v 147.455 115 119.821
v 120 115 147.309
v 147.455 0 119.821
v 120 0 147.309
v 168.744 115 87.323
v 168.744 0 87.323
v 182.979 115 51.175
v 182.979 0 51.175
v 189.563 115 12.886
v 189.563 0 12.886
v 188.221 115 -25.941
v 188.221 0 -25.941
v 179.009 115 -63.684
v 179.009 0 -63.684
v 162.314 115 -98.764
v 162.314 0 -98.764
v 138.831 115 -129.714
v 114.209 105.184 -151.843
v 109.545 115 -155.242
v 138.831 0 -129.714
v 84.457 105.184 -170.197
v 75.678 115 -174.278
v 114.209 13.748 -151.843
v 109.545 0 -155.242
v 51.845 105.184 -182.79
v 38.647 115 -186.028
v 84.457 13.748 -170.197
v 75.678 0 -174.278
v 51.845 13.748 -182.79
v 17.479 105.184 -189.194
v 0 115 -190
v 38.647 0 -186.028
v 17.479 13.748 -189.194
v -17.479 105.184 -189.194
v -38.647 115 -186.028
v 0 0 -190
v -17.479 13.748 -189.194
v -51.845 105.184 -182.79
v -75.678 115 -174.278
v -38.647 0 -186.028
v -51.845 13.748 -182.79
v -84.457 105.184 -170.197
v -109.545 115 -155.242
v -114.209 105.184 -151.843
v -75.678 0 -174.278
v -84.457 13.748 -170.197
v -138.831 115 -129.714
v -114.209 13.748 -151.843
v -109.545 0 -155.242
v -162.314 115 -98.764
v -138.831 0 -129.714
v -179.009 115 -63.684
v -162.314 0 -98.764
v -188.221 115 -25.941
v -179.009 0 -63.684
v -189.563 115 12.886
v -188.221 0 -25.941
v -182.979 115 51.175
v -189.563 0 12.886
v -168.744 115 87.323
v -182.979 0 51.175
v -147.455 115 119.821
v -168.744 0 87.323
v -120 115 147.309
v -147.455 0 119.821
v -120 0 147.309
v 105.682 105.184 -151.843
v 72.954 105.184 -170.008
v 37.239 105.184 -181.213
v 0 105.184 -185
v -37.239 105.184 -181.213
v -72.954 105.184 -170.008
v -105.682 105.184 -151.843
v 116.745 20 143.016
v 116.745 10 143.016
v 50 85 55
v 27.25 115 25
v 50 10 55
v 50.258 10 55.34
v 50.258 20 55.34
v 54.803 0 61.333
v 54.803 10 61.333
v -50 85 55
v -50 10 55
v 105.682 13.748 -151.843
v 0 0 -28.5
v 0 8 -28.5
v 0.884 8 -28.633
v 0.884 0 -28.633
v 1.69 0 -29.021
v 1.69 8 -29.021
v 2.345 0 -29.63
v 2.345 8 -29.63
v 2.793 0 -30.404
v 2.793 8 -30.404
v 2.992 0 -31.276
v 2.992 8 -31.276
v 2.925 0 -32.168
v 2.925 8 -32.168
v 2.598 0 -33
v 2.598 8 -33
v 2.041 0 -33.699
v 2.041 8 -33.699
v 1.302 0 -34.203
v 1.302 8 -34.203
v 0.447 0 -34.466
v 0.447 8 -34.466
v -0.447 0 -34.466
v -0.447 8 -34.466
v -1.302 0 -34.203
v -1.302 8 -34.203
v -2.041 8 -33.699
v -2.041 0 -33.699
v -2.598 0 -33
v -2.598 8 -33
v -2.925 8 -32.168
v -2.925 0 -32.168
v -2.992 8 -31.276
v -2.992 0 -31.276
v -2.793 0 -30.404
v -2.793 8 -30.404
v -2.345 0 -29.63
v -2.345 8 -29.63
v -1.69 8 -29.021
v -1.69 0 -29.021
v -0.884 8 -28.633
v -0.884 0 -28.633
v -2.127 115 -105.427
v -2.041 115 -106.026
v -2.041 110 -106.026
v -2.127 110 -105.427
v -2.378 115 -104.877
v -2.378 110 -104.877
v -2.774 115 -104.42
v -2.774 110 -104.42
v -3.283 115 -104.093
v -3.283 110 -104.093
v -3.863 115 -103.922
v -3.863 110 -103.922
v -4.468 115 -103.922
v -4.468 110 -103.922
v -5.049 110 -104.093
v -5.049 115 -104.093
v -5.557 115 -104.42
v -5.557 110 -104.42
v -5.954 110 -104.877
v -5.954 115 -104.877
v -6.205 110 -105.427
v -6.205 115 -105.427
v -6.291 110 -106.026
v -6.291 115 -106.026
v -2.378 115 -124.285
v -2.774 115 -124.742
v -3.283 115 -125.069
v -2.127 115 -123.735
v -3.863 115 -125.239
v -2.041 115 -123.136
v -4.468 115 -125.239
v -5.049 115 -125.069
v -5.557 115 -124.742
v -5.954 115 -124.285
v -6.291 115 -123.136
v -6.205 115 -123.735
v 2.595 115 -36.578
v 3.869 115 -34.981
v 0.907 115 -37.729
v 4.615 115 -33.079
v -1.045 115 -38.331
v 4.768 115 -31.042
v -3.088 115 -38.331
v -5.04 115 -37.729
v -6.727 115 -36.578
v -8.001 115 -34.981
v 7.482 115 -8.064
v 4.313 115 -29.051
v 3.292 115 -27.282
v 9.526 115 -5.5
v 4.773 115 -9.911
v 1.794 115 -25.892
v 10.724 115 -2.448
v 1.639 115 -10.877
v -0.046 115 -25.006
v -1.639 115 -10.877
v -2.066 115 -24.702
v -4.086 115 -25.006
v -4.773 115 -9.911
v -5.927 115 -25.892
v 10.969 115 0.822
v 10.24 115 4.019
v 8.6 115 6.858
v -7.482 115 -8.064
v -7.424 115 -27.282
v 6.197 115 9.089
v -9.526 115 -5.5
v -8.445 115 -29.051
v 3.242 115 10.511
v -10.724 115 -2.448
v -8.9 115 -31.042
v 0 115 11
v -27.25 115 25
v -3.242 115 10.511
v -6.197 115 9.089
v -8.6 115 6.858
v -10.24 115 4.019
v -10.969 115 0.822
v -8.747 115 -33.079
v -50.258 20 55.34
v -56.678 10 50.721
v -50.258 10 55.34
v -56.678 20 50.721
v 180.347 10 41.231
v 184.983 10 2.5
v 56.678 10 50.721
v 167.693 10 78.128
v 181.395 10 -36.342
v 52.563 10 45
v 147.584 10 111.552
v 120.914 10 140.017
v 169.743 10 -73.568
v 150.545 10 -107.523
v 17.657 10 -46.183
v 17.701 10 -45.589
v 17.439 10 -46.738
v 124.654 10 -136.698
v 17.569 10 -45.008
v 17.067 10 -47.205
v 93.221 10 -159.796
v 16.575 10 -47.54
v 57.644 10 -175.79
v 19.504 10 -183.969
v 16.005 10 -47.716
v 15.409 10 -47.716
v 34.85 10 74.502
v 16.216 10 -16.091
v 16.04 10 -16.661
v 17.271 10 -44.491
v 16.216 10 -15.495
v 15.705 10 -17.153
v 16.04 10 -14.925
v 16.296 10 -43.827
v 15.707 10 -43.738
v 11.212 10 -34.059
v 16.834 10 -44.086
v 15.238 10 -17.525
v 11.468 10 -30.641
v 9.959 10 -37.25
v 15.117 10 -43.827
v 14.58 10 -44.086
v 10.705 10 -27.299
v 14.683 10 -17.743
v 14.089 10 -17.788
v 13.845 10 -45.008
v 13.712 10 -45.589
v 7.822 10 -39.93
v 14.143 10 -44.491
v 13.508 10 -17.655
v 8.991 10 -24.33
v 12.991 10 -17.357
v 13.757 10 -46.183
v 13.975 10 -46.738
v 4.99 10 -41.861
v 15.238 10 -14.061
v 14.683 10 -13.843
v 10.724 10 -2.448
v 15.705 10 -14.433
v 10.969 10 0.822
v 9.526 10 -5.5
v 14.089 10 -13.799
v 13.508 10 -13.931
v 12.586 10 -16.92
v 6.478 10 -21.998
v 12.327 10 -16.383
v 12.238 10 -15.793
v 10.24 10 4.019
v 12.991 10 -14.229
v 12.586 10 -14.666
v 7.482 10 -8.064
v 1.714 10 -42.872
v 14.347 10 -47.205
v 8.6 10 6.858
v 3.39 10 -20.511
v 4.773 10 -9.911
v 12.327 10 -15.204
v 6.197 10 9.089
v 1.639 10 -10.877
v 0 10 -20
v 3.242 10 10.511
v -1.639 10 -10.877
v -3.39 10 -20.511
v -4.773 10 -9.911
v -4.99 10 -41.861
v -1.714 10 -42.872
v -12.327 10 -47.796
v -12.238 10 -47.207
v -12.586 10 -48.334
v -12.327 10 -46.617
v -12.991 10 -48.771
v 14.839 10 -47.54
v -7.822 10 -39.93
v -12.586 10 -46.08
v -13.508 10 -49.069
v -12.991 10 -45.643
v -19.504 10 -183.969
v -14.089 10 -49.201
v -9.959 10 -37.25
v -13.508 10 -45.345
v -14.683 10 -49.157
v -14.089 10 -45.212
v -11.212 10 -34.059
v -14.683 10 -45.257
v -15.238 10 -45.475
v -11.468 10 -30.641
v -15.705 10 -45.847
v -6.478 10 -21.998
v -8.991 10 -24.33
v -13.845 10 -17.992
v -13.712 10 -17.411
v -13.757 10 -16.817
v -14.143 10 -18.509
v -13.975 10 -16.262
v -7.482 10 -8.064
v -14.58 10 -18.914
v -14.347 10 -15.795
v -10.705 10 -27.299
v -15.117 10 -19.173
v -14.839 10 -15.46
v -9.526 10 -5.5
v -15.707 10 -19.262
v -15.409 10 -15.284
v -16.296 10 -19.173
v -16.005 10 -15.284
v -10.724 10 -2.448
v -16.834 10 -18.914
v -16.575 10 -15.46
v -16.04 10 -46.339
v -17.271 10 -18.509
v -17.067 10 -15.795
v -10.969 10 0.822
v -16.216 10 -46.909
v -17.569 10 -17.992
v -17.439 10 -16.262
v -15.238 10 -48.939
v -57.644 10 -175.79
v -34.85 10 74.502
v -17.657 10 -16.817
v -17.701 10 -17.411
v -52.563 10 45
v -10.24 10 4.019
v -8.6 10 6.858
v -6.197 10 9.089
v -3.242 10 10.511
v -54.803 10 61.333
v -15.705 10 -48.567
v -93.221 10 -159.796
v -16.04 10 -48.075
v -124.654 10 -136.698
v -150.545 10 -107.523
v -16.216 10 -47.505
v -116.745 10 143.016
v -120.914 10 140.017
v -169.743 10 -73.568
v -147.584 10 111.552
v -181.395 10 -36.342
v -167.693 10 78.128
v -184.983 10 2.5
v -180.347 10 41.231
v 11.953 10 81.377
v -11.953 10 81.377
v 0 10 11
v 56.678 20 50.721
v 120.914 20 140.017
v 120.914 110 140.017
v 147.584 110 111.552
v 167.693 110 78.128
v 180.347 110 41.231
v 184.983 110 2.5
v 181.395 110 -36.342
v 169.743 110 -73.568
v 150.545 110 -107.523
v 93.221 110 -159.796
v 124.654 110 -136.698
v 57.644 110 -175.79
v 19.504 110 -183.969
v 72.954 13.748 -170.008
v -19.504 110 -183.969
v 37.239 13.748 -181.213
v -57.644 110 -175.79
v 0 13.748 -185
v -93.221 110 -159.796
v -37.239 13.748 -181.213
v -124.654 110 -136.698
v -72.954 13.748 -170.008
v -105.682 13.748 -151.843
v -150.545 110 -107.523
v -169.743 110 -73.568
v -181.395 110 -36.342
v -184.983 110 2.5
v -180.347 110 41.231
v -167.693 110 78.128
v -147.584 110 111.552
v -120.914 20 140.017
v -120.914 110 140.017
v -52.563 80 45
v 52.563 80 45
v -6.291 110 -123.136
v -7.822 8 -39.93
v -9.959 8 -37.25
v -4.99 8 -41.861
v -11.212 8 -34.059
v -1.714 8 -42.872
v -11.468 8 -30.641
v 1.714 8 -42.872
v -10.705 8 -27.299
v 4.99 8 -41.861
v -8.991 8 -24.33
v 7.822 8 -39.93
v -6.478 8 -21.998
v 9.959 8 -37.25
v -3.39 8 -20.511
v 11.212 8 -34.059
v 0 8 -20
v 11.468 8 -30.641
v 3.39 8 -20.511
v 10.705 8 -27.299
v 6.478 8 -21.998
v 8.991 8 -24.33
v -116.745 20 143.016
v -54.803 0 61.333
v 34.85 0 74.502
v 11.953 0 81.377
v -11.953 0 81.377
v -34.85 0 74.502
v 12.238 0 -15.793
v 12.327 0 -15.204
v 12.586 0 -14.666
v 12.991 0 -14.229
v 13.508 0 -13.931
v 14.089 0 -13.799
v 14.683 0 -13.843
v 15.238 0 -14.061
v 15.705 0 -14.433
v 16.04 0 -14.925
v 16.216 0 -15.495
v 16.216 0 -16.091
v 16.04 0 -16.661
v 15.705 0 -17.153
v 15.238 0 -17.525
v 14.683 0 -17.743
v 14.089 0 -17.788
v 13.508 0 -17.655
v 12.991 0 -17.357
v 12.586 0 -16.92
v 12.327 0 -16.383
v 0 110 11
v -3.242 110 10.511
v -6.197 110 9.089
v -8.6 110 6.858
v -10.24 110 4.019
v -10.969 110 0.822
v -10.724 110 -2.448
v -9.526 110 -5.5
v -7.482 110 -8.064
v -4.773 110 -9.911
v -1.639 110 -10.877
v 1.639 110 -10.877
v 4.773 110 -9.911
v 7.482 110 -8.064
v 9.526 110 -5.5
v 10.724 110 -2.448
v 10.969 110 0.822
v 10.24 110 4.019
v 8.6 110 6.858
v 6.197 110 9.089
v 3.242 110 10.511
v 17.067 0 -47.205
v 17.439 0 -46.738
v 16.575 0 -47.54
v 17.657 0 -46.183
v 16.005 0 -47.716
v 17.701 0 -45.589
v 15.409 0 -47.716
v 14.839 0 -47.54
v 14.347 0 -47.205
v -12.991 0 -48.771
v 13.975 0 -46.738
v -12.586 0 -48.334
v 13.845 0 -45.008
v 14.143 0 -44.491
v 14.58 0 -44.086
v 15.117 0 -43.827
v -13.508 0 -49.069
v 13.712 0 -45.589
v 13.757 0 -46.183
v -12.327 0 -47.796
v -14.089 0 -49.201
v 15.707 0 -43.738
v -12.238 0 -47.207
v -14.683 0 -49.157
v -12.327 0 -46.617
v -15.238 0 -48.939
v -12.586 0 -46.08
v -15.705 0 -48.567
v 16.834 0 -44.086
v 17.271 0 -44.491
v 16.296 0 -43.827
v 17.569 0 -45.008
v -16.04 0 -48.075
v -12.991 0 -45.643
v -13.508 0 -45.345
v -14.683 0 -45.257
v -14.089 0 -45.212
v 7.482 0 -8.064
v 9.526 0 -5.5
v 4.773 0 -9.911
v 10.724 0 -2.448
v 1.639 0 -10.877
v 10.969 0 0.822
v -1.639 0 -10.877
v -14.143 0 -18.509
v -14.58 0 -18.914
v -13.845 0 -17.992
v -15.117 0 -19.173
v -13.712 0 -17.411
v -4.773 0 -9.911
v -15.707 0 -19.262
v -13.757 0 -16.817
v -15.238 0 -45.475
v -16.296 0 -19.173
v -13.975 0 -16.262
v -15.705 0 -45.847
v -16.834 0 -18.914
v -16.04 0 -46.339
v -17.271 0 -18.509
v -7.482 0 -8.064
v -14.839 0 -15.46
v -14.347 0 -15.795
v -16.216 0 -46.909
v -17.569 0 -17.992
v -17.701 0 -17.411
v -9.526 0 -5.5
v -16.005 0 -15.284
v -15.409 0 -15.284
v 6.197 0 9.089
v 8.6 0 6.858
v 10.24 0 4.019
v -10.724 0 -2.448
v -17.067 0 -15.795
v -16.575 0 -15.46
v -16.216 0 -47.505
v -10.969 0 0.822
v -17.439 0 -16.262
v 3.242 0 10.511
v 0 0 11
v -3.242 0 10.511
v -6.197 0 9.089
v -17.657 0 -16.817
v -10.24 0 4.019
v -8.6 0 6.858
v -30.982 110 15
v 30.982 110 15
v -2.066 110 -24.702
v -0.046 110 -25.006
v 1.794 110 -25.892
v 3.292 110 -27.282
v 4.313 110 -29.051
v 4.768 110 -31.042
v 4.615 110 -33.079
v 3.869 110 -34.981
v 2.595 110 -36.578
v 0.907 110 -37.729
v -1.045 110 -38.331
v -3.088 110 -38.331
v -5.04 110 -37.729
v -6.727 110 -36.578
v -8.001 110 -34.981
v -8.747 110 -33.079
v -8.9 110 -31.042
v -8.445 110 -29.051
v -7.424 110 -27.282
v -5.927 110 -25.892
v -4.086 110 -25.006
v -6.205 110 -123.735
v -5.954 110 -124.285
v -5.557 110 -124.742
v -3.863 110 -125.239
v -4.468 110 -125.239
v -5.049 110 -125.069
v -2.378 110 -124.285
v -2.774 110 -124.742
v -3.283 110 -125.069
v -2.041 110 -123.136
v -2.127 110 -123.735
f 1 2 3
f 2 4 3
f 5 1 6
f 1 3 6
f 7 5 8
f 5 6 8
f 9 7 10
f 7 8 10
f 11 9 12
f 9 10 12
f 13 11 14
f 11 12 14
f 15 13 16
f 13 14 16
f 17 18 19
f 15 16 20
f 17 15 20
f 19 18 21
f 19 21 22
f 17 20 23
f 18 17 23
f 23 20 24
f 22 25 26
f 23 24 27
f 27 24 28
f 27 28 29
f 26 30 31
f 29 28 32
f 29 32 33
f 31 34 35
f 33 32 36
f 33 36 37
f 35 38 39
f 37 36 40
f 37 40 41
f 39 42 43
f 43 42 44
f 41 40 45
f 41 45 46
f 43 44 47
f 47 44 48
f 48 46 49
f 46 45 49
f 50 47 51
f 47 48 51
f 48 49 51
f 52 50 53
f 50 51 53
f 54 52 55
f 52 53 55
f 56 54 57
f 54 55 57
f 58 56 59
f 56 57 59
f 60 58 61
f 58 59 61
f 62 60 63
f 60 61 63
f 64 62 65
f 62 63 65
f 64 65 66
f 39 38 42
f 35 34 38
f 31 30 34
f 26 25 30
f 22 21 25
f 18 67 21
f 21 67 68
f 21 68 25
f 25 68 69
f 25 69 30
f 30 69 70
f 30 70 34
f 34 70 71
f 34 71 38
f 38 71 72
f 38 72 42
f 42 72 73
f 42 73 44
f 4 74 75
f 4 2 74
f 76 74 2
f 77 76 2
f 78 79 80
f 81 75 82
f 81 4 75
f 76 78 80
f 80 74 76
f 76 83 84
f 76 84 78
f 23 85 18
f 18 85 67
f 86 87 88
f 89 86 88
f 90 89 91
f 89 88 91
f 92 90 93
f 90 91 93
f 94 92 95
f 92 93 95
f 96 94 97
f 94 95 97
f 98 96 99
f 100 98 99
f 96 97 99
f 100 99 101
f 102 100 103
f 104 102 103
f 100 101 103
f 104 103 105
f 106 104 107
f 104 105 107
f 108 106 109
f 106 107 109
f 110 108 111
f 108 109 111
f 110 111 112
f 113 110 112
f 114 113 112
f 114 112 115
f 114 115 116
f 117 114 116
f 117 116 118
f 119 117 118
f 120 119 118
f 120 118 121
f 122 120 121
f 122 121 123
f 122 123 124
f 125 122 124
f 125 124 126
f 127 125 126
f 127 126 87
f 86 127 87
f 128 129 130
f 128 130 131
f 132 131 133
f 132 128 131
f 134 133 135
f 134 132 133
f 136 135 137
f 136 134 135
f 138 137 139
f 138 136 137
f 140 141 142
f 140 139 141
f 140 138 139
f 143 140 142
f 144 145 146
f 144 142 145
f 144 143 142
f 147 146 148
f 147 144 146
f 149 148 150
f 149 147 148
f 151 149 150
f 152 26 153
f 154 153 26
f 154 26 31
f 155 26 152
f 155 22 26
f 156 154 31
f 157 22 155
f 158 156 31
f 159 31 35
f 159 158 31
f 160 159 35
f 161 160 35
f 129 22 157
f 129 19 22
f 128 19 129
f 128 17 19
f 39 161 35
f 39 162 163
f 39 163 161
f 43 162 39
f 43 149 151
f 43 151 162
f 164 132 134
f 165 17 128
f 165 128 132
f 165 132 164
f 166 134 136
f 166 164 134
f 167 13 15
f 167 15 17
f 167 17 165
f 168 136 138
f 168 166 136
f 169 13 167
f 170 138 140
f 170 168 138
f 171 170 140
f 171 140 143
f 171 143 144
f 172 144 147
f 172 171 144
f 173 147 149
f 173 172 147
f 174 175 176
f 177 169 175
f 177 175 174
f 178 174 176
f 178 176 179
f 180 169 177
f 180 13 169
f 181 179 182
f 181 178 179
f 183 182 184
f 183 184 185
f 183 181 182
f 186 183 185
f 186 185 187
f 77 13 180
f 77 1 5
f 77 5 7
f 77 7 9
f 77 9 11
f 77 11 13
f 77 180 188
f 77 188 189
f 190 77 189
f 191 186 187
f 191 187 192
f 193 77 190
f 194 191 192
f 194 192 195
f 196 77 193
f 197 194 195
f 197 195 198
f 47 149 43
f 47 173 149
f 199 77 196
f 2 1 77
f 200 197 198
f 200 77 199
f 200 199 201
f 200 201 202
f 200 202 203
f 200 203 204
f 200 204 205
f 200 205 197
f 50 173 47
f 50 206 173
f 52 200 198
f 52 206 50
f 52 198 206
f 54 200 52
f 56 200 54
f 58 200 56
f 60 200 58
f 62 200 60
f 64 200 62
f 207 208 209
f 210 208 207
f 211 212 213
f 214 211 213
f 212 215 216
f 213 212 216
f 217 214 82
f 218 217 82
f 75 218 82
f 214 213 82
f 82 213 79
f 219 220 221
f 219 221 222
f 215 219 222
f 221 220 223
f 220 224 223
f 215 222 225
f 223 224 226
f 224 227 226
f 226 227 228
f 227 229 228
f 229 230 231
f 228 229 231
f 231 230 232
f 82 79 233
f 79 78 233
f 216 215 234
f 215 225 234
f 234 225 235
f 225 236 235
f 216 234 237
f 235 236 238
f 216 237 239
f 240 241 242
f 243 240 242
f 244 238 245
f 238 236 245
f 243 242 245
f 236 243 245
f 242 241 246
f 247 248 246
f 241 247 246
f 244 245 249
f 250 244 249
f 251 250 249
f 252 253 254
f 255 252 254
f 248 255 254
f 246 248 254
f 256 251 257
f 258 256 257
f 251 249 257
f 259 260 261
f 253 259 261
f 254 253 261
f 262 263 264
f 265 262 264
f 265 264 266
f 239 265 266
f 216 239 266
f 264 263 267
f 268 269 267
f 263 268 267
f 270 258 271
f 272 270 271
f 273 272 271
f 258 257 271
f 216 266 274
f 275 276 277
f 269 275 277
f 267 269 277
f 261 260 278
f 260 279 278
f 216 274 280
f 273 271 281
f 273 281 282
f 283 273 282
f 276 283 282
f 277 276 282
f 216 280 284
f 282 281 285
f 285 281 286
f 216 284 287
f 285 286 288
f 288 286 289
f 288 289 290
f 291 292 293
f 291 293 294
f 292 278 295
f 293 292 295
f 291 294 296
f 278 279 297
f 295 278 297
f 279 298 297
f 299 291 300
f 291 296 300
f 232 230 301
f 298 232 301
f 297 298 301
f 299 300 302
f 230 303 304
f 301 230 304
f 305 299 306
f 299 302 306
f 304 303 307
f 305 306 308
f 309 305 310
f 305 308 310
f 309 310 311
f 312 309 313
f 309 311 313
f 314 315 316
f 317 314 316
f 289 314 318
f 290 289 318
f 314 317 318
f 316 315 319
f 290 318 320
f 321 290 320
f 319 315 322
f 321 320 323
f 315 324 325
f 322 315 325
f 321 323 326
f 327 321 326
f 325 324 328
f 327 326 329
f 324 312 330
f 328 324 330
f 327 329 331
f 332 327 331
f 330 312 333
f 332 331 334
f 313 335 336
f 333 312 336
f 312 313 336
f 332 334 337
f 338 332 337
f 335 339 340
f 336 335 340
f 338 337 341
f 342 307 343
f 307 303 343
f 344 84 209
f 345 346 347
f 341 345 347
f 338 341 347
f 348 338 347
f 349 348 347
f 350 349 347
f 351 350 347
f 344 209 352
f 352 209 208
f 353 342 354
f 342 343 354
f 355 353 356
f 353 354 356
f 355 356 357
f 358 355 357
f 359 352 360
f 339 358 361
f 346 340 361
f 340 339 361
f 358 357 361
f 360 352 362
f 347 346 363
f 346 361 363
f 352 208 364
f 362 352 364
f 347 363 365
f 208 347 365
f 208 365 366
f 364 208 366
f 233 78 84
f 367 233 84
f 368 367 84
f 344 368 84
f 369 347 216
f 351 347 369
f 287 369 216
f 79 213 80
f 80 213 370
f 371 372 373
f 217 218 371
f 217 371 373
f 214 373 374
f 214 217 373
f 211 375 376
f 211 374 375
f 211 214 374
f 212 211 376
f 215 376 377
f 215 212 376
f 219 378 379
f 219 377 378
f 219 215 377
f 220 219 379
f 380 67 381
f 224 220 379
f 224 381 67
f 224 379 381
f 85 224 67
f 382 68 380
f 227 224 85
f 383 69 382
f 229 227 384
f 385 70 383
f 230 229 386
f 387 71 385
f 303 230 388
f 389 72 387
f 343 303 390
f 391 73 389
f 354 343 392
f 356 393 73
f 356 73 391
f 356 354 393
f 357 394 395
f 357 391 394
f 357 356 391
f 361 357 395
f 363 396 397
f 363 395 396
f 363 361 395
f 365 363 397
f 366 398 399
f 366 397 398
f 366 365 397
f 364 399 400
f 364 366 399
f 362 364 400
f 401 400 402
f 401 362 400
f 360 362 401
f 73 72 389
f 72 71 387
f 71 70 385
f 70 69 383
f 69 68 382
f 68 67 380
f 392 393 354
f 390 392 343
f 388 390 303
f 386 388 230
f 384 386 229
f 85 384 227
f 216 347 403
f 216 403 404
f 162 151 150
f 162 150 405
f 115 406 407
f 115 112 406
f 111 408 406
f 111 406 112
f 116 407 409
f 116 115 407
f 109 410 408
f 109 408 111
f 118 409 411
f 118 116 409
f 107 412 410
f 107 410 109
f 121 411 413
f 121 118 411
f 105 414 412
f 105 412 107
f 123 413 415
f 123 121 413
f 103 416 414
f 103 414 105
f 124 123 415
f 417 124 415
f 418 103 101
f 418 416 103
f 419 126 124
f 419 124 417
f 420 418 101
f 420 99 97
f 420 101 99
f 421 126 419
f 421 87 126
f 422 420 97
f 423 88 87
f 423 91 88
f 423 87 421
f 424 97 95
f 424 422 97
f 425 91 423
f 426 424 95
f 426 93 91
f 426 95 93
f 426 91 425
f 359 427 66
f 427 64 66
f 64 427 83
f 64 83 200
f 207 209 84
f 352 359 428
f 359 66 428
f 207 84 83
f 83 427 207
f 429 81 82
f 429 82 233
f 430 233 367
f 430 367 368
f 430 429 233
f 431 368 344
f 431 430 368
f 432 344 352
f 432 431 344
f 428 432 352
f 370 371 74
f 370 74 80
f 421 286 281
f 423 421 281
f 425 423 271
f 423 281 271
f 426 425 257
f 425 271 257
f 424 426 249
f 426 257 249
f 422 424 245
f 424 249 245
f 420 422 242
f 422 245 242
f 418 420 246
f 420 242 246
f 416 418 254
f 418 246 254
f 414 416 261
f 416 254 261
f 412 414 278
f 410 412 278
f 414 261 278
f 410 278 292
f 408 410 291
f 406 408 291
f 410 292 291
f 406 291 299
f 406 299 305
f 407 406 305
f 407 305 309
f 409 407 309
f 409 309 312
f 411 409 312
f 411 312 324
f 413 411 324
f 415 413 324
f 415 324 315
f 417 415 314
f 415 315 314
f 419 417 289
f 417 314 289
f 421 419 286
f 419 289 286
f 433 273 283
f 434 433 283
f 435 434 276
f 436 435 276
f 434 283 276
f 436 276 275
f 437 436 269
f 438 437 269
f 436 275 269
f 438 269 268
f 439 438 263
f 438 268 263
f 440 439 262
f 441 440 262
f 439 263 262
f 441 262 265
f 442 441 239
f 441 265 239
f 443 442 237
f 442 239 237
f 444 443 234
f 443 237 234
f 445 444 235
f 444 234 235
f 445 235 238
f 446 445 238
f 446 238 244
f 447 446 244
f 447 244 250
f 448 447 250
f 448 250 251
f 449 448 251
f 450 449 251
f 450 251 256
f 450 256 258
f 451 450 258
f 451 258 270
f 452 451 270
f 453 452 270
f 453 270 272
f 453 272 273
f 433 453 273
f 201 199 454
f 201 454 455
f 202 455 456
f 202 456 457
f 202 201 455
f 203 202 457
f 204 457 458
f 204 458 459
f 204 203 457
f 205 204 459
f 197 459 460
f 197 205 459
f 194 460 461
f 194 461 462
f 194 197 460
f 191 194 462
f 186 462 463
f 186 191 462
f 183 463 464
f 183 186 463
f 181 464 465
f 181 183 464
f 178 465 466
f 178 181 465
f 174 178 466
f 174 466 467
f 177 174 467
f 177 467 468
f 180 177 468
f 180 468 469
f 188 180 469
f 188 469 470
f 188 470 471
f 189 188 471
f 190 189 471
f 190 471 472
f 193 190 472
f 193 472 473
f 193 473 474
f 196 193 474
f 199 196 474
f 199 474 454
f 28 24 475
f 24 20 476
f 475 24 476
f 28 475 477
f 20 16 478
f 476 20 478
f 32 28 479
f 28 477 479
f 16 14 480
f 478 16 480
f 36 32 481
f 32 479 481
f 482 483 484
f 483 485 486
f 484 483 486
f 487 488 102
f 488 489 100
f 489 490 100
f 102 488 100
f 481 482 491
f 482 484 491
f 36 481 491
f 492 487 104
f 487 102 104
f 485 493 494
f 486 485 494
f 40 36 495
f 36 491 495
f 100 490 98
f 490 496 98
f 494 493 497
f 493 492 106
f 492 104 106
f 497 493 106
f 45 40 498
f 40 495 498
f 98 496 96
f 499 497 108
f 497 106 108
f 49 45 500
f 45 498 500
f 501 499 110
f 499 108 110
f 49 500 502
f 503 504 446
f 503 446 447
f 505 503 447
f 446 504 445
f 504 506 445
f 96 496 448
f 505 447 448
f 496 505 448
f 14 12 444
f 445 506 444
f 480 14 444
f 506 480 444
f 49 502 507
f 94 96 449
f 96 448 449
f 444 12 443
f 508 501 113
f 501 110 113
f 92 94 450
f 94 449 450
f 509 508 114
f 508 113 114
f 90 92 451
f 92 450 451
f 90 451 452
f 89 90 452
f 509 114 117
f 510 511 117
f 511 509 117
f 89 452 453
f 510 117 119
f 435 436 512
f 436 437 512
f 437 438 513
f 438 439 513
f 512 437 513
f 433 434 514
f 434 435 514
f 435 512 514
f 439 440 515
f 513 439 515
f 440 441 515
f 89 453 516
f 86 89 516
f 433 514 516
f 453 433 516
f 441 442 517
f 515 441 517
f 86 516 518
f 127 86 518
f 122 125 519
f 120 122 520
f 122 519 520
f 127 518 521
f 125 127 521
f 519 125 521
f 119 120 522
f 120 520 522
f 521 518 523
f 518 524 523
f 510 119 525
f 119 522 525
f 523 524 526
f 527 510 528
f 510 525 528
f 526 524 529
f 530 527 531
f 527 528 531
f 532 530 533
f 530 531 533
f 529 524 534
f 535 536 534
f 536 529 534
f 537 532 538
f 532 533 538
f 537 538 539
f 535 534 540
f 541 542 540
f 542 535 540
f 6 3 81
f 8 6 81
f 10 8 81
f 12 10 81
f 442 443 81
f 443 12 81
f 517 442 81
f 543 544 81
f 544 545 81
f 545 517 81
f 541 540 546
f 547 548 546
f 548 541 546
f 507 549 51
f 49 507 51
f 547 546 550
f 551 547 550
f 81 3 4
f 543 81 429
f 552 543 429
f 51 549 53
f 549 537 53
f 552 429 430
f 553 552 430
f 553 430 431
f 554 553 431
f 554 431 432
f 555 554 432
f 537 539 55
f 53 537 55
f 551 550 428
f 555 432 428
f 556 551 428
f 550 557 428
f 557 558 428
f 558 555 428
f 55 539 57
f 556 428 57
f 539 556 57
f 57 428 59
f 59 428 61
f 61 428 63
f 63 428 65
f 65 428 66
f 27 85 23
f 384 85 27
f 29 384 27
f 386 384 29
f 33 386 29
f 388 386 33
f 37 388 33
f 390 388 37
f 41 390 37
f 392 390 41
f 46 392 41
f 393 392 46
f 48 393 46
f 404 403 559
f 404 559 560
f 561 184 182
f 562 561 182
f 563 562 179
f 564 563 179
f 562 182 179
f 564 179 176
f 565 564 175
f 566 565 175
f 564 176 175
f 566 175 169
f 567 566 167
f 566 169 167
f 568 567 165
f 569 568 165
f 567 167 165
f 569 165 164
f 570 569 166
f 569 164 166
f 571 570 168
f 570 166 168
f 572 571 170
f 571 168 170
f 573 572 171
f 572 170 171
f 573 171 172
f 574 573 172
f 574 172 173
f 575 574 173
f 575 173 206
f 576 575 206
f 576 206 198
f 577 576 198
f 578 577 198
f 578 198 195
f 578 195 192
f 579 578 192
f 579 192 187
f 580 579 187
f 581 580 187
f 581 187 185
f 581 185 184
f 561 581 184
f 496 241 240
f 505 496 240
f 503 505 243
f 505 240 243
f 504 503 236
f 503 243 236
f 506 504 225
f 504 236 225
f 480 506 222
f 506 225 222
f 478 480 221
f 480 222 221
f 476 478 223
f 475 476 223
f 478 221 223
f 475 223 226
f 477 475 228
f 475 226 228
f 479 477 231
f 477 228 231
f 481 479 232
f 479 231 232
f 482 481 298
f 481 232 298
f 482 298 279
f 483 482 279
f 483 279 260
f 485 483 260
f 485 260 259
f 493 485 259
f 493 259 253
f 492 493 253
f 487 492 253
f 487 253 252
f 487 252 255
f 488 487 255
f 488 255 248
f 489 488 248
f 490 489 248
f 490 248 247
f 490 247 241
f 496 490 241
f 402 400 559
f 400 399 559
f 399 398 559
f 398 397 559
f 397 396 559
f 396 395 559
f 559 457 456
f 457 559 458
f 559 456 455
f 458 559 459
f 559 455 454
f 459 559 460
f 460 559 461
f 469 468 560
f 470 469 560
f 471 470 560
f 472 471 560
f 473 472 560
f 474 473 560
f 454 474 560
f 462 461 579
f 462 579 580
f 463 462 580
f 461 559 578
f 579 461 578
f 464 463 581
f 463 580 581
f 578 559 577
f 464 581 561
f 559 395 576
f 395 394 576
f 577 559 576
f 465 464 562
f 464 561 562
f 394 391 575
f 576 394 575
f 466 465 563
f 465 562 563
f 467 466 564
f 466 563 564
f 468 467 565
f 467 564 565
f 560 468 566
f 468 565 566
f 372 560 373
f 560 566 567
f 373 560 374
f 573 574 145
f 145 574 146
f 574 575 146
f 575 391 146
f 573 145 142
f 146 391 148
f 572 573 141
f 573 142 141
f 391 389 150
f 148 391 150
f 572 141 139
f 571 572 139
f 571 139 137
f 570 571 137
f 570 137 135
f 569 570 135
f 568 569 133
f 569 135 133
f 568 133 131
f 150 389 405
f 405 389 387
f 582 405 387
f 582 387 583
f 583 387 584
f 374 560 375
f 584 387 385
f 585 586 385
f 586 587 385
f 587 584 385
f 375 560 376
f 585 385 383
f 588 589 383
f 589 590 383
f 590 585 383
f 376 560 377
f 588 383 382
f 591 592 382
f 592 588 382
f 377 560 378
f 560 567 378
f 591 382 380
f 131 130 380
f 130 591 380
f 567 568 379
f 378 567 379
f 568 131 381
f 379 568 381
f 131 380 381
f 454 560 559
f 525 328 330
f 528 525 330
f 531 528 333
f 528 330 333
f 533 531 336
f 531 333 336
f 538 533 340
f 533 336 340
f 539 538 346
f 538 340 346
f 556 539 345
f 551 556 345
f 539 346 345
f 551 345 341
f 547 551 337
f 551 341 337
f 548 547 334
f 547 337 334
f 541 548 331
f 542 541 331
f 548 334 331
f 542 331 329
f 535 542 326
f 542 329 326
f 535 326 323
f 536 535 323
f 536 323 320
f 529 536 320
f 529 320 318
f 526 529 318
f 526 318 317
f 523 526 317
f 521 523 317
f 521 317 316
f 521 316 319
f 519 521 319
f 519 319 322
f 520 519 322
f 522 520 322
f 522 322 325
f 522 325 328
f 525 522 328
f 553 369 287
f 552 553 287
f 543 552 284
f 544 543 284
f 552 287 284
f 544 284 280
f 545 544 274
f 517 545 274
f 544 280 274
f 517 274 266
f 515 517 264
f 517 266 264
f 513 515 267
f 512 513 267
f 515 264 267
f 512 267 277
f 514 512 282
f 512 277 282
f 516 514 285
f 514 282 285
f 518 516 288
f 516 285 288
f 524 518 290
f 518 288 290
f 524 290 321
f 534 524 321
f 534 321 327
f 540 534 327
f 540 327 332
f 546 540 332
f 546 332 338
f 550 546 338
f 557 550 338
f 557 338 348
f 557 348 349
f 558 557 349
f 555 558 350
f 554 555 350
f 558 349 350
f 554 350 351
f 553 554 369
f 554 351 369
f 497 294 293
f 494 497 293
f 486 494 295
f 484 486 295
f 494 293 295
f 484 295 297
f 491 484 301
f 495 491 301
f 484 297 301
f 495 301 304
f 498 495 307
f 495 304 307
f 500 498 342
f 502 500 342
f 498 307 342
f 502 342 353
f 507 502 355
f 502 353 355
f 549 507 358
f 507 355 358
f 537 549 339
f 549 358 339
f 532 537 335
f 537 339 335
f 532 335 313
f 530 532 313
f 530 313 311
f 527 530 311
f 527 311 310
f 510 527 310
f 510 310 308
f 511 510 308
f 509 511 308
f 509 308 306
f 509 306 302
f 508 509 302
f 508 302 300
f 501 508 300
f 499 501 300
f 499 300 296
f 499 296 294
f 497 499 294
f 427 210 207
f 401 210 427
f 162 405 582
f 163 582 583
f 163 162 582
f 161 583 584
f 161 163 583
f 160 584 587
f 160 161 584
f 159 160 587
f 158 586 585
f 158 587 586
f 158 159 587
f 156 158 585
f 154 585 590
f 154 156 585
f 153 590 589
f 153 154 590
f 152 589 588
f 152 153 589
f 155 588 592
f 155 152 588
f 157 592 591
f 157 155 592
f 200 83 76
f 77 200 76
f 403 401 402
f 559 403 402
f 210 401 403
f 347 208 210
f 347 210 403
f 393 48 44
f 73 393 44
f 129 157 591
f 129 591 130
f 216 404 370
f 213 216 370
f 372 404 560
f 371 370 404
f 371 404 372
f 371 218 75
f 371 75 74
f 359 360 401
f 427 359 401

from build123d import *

# Parameters (mm, degrees)
SKETCH_1_R                = 190
EXTRUDE_1_DEPTH           = 10
SKETCH_2_R                = 11
CUT_EXTRUDE_1_DEPTH       = 10
CUT_EXTRUDE_2_DEPTH       = 10
CUT_EXTRUDE_3_DEPTH       = 10
SKETCH_5_R                = 11.5
CUT_EXTRUDE_4_DEPTH       = 2
SKETCH_6_R                = 3
CUT_EXTRUDE_5_DEPTH       = 22
SKETCH_7_R                = 2
CUT_EXTRUDE_6_DEPTH       = 20
PATTERN_CIRCULAR_1_COUNT  = 4
EXTRUDE_2_DEPTH           = 100
EXTRUDE_3_DEPTH           = 5
CUT_EXTRUDE_START         = -5
SKETCH_11_R               = 11
CUT_EXTRUDE_7_DEPTH       = 5
SKETCH_12_W               = 100
SKETCH_12_H               = 115
EXTRUDE_4_DEPTH           = 5
EXTRUDE_5_DEPTH           = 115
CUT_EXTRUDE_8_DEPTH       = 289.487434735
SKETCH_15_W               = 110
SKETCH_15_H               = 10
CUT_EXTRUDE_9_DEPTH       = 23
SKETCH_16_W               = 110
SKETCH_16_H               = 10
CUT_EXTRUDE_10_DEPTH      = 23
EXTRUDE_6_DEPTH           = 10
SKETCH_18_R               = 10
EXTRUDE_7_DEPTH           = 100
SKETCH_20_W               = 40.15762627
SKETCH_20_H               = 37.957208392
EXTRUDE_8_DEPTH           = 20
CUT_EXTRUDE_11_DEPTH      = 70
SKETCH_22_W               = 6
SKETCH_22_H               = 39.800206828
SKETCH_24_R               = 10.715541735
EXTRUDE_9_DEPTH           = 50
SKETCH_25_R               = 8.111462828
CUT_EXTRUDE_13_DEPTH      = 1
FILLET_2_R                = 3
SKETCH_26_W               = 20.914862296
SKETCH_26_H               = 66.390296829
CUT_EXTRUDE_14_DEPTH      = 41
EXTRUDE_START             = -5
EXTRUDE_10_DEPTH          = 5
CUT_EXTRUDE_15_DEPTH      = 369.496652909
CUT_EXTRUDE_15_DEPTH_BACK = 369.496652909
SKETCH_28_W               = 81.996426071
SKETCH_28_H               = 91.436240801
EXTRUDE_11_DEPTH          = 142
SKETCH_30_W               = 61.807944975
SKETCH_30_H               = 65.134221846
EXTRUDE_12_DEPTH          = 5
FILLET_4_R                = 13
SKETCH_31_W               = 61.807944975
SKETCH_31_H               = 147
EXTRUDE_13_DEPTH          = 70
SKETCH_32_W               = 51.807944975
SKETCH_32_H               = 142
CUT_EXTRUDE_16_DEPTH      = 60
FILLET_5_R                = 13
FILLET_6_R                = 13
CUT_EXTRUDE_17_DEPTH      = 60
CUT_EXTRUDE_18_DEPTH      = 60
EXTRUDE_START_2           = -75
SKETCH_35_W               = 61.807944975
SKETCH_35_H               = 6.562212177
EXTRUDE_14_DEPTH          = 75
CUT_EXTRUDE_19_DEPTH      = 60
CUT_EXTRUDE_START_2       = 70
CUT_EXTRUDE_20_DEPTH      = 70
SKETCH_40_R               = 6.852948308
CUT_EXTRUDE_24_DEPTH      = 10
CHAMFER_1_SIZE            = 30
CHAMFER_2_SIZE            = 30
CUT_EXTRUDE_25_DEPTH      = 216


# Read off the part's stored shape, not the designer's step: 圆顶1
with BuildPart() as part:
    # 草图1 → 凸台-拉伸1 (new body)
    with BuildSketch(Plane(origin=(0, 0, 0), x_dir=(1, 0, 0), z_dir=(0, 1, 0))):
        with Locations(Location((0, 0, 0), (0, 0, 270))):
            Circle(SKETCH_1_R)
    extrude(amount=EXTRUDE_1_DEPTH)

    # 草图2 → 切除-拉伸1 (cut)
    with BuildSketch(Plane(origin=(0, 10, 0), x_dir=(1, 0, 0), z_dir=(0, 1, 0))):
        with Locations(Location((0, 0, 0), (0, 0, 270))):
            Circle(SKETCH_2_R)
    extrude(amount=-CUT_EXTRUDE_1_DEPTH, mode=Mode.SUBTRACT)

    # 草图3 → 切除-拉伸2 (cut)
    with BuildSketch(Plane(origin=(0, 10, 0), x_dir=(1, 0, 0), z_dir=(0, 1, 0))):
        Polygon((-50, -50), (-120, -147.309198627), (120, -147.309198627), (50, -50), align=None)
    extrude(amount=-CUT_EXTRUDE_2_DEPTH, mode=Mode.SUBTRACT)

    # 草图4 → 切除-拉伸3 (cut)
    with BuildSketch(Plane(origin=(0, 10, 0), x_dir=(1, 0, 0), z_dir=(0, 1, 0))):
        Polygon((50, -50), (136.06201209, -169.637506124), (-54.476164161, -215.928987862), (-150.534220248, -169.637506124), (-120, -147.309198627), (-80.889727825, -92.940780863), align=None)
    extrude(amount=-CUT_EXTRUDE_3_DEPTH, mode=Mode.SUBTRACT)

    # 草图5 → 切除-拉伸4 (cut)
    with BuildSketch(Plane(origin=(0, 10, 0), x_dir=(1, 0, 0), z_dir=(0, 1, 0))):
        with Locations(Location((0, 31.5, 0), (0, 0, 270))):
            Circle(SKETCH_5_R)
    extrude(amount=-CUT_EXTRUDE_4_DEPTH, mode=Mode.SUBTRACT)

    # 草图6 → 切除-拉伸5 (cut)
    with BuildSketch(Plane(origin=(0, 8, 0), x_dir=(1, 0, 0), z_dir=(0, 1, 0))):
        with Locations(Location((0, 31.5, 0), (0, 0, 270))):
            Circle(SKETCH_6_R)
    extrude(amount=-CUT_EXTRUDE_5_DEPTH, mode=Mode.SUBTRACT)

    # 草图7 → 切除-拉伸6 (cut)
    with BuildSketch(Plane(origin=(0, 10, 0), x_dir=(1, 0, 0), z_dir=(0, 1, 0))):
        with Locations(Location((15.706904535, 45.738439167, 0), (0, 0, 270))):
            Circle(SKETCH_7_R)
    cut_extrude_6 = extrude(amount=-CUT_EXTRUDE_6_DEPTH, mode=Mode.SUBTRACT)

    # 阵列(圆周)1: 切除-拉伸6 ×4 about axis
    pattern_circular_1_axis = Axis((0, 0, -31.5), (0, 1, 0))
    for i in range(1, PATTERN_CIRCULAR_1_COUNT):
        add(cut_extrude_6.rotate(pattern_circular_1_axis, i * 360 / PATTERN_CIRCULAR_1_COUNT), mode=Mode.SUBTRACT)

    # 草图9 → 凸台-拉伸2 (add)
    with BuildSketch(Plane(origin=(0, 10, 0), x_dir=(1, 0, 0), z_dir=(0, 1, 0))):
        with BuildLine():
            Line((50, -50), (120, -147.309198627))
            ThreePointArc((120, -147.309198627), (0, 190), (-120, -147.309198627))
            Line((-120, -147.309198627), (-50, -50))
            Line((-50, -50), (50, -50))
        make_face()
        with BuildLine():
            Line((52.56250687, -45), (120.913822869, -140.017311213))
            ThreePointArc((120.913822869, -140.017311213), (0, 185), (-120.913822869, -140.017311213))
            Line((-120.913822869, -140.017311213), (-52.56250687, -45))
            Line((-52.56250687, -45), (52.56250687, -45))
        make_face(mode=Mode.SUBTRACT)
    extrude(amount=EXTRUDE_2_DEPTH)

    # 草图10 → 凸台-拉伸3 (add)
    with BuildSketch(Plane(origin=(0, 110, 0), x_dir=(1, 0, 0), z_dir=(0, 1, 0))):
        with BuildLine():
            Line((-50, -50), (50, -50))
            Line((50, -50), (120, -147.309198627))
            ThreePointArc((120, -147.309198627), (0, 190), (-120, -147.309198627))
            Line((-120, -147.309198627), (-50, -50))
        make_face()
    extrude(amount=EXTRUDE_3_DEPTH)

    # 草图11 → 切除-拉伸7 (cut)
    with BuildSketch(Plane.XZ.offset(-110).offset(CUT_EXTRUDE_START)):
        with Locations(Location((0, 0, 0), (0, 0, 90))):
            Circle(SKETCH_11_R)
    extrude(amount=CUT_EXTRUDE_7_DEPTH, mode=Mode.SUBTRACT)

    # 草图12 → 凸台-拉伸4 (add)
    with BuildSketch(Plane.XY.offset(50)):
        with Locations((0, 57.5)):
            Rectangle(SKETCH_12_W, SKETCH_12_H)
    extrude(amount=EXTRUDE_4_DEPTH)

    # 草图13 → 凸台-拉伸5 (add)
    with BuildSketch(Plane.XZ):
        Polygon((-120, 147.309198627), (-50, 55), (-50, 50), align=None)
        Polygon((50, 50), (120, 147.309198627), (50, 55), align=None)
    extrude(amount=-EXTRUDE_5_DEPTH)

    # 草图14 → 切除-拉伸8 (cut, through all)
    with BuildSketch(Plane(origin=(0, 10, 0), x_dir=(1, 0, 0), z_dir=(0, 1, 0))):
        with BuildLine():
            Line((-175, 60), (175, 60))
            ThreePointArc((175, 60), (0, 185), (-175, 60))
        make_face()
    extrude(amount=CUT_EXTRUDE_8_DEPTH, mode=Mode.SUBTRACT)

    # 草图15 → 切除-拉伸9 (cut)
    with BuildSketch(Plane(origin=(-13.305974514, 0, -9.571738635), x_dir=(-0.5839606140594331, 0, 0.8117819911942675), z_dir=(-0.8117819911942675, 0, -0.5839606140594331))):
        with Locations((129.272441949, 15)):
            Rectangle(SKETCH_15_W, SKETCH_15_H)
    extrude(amount=-CUT_EXTRUDE_9_DEPTH, mode=Mode.SUBTRACT)

    # 草图16 → 切除-拉伸10 (cut)
    with BuildSketch(Plane(origin=(13.305974514, 0, -9.571738635), x_dir=(-0.5839606140594333, 0, -0.8117819911942674), z_dir=(0.8117819911942673, 0, -0.5839606140594332))):
        with Locations((-129.272441949, 15)):
            Rectangle(SKETCH_16_W, SKETCH_16_H)
    extrude(amount=-CUT_EXTRUDE_10_DEPTH, mode=Mode.SUBTRACT)

    # 草图17 → 凸台-拉伸6 (add)
    with BuildSketch(Plane.XZ):
        with BuildLine():
            Line((-68.721971502, 45.192401274), (70.16486598, 42.91799252))
            ThreePointArc((70.16486598, 42.91799252), (1.34674419, 82.238973608), (-68.721971502, 45.192401274))
        make_face()
    extrude(amount=-EXTRUDE_6_DEPTH)

    # 草图18 → 凸台-拉伸7 (add)
    with BuildSketch(Plane(origin=(0, 115, 0), x_dir=(1, 0, 0), z_dir=(0, 1, 0))):
        with Locations(Location((0, 46.854928923, 0), (0, 0, 90))):
            Circle(SKETCH_18_R)
    extrude(amount=EXTRUDE_7_DEPTH)

    # 草图20 → 凸台-拉伸8 (add)
    with BuildSketch(Plane(origin=(0, 215, 0), x_dir=(1, 0, 0), z_dir=(0, 1, 0))):
        with Locations((-0.847426087, 46.622471939)):
            Rectangle(SKETCH_20_W, SKETCH_20_H)
    extrude(amount=EXTRUDE_8_DEPTH)

    # 草图21 → 切除-拉伸11 (cut)
    with BuildSketch(Plane.ZY.offset(20.926239222)):
        Polygon((-54.791741718, 236.72389037), (-19.944006341, 217.982251176), (-19.065492004, 240.530785832), align=None)
    extrude(amount=-CUT_EXTRUDE_11_DEPTH, mode=Mode.SUBTRACT)

    # 草图22 → 旋转1 (revolve)
    with BuildSketch(Plane(origin=(0, 160.757687824, 86.457916141), x_dir=(1, 0, 0), z_dir=(0, 0.8807086333026608, 0.4736584246333635)), mode=Mode.PRIVATE) as revolve_1_sk:
        with Locations((1.240539722, 142.968257651)):
            Rectangle(SKETCH_22_W, SKETCH_22_H)
    revolve(revolve_1_sk.sketch.rotate(Axis((-1.759460278, 237.901659149, -56.981655541), (0, -0.47365842463336366, 0.8807086333026606)), 90), axis=Axis((-1.759460278, 237.901659149, -56.981655541), (0, -0.47365842463336366, 0.8807086333026606)))

    # 草图24 → 凸台-拉伸9 (add)
    with BuildSketch(Plane(origin=(0, 58.292268059, -108.387185922), x_dir=(1, 0, 0), z_dir=(0, -0.4736584246333635, 0.8807086333026606))):
        with Locations(Location((-1.759460278, 182.532203893, 0), (0, 0, 270))):
            Circle(SKETCH_24_R)
    extrude(amount=-EXTRUDE_9_DEPTH)

    # 草图25 → 切除-拉伸13 (cut)
    with BuildSketch(Plane(origin=(0, 58.292268059, -108.387185922), x_dir=(1, 0, 0), z_dir=(0, -0.4736584246333635, 0.8807086333026606))):
        with Locations(Location((-1.759460278, 182.532203893, 0), (0, 0, 270))):
            Circle(SKETCH_25_R)
    extrude(amount=-CUT_EXTRUDE_13_DEPTH, mode=Mode.SUBTRACT)

    # 圆角2
    fillet_2_edges = [part.edges().sort_by_distance(p)[0] for p in [
        (0, 115, -36.854928923),
    ]]
    fillet(fillet_2_edges, radius=FILLET_2_R)

    # 草图26 → 切除-拉伸14 (cut)
    with BuildSketch(Plane(origin=(0, 160.757687824, 86.457916141), x_dir=(1, 0, 0), z_dir=(0, 0.8807086333026608, 0.4736584246333635))):
        with Locations((27.855490238, 146.001600843)):
            Rectangle(SKETCH_26_W, SKETCH_26_H)
    extrude(amount=-CUT_EXTRUDE_14_DEPTH, mode=Mode.SUBTRACT)

    # 草图27 → 凸台-拉伸10 (add)
    with BuildSketch(Plane(origin=(0, 115, 0), x_dir=(1, 0, 0), z_dir=(0, 1, 0)).offset(EXTRUDE_START)):
        with BuildLine():
            Line((-175, 60), (175, 60))
            ThreePointArc((175, 60), (0, 185), (-175, 60))
        make_face()
    extrude(amount=EXTRUDE_10_DEPTH)

    # 草图28 → 切除-拉伸15 (cut, two sides: drawn at the far end of the back side and taken through both)
    with BuildSketch(Plane(origin=(0, 0, 0), x_dir=(0, 0, -1), z_dir=(1, 0, 0)).offset(-CUT_EXTRUDE_15_DEPTH_BACK)):
        with Locations((192.841193776, 59.465903433)):
            Rectangle(SKETCH_28_W, SKETCH_28_H)
    extrude(amount=CUT_EXTRUDE_15_DEPTH + CUT_EXTRUDE_15_DEPTH_BACK, mode=Mode.SUBTRACT)

    # 草图29 → 凸台-拉伸11 (add)
    with BuildSketch(Plane(origin=(0, 115, 0), x_dir=(1, 0, 0), z_dir=(0, 1, 0))):
        Polygon((-32.985541705, 83.704196909), (-32.985541705, 18.569975063), (-27.985541705, 18.569975063), (-27.985541705, 78.704196909), (23.82240327, 78.704196909), (23.82240327, 18.569975063), (28.82240327, 18.569975063), (28.82240327, 83.704196909), align=None)
    extrude(amount=EXTRUDE_11_DEPTH)

    # 草图30 → 凸台-拉伸12 (add)
    with BuildSketch(Plane(origin=(0, 257, 0), x_dir=(1, 0, 0), z_dir=(0, 1, 0))):
        with Locations((-2.081569218, 51.137085986)):
            Rectangle(SKETCH_30_W, SKETCH_30_H)
    extrude(amount=EXTRUDE_12_DEPTH)

    # 圆角4
    fillet_4_edges = [part.edges().sort_by_distance(p)[0] for p in [
        (-27.985541705, 257, -48.637085986),
        (23.82240327, 257, -48.637085986),
    ]]
    fillet(fillet_4_edges, radius=FILLET_4_R)

    # 草图31 → 凸台-拉伸13 (add)
    with BuildSketch(Plane(origin=(0, 0, -83.704196909), x_dir=(-1, 0, 0), z_dir=(0, 0, -1))):
        with Locations((2.081569218, 188.5)):
            Rectangle(SKETCH_31_W, SKETCH_31_H)
    extrude(amount=EXTRUDE_13_DEPTH)

    # 草图32 → 切除-拉伸16 (cut)
    with BuildSketch(Plane(origin=(0, 0, -153.704196909), x_dir=(-1, 0, 0), z_dir=(0, 0, -1))):
        with Locations((2.081569218, 186)):
            Rectangle(SKETCH_32_W, SKETCH_32_H)
    extrude(amount=-CUT_EXTRUDE_16_DEPTH, mode=Mode.SUBTRACT)

    # 圆角5
    fillet_5_edges = [part.edges().sort_by_distance(p)[0] for p in [
        (-32.985541705, 262, -86.137085986),
        (28.82240327, 262, -86.137085986),
    ]]
    fillet(fillet_5_edges, radius=FILLET_5_R)

    # 圆角6
    fillet_6_edges = [part.edges().sort_by_distance(p)[0] for p in [
        (23.82240327, 257, -123.704196909),
        (-27.985541705, 257, -123.704196909),
    ]]
    fillet(fillet_6_edges, radius=FILLET_6_R)

    # 草图33 → 切除-拉伸17 (cut)
    with BuildSketch(Plane.XY.offset(-78.704196909)):
        with BuildLine():
            Line((13.892318938, 199.249147057), (13.892318938, 143.139086494))
            ThreePointArc((13.892318938, 143.139086494), (0, 129.246767556), (-13.892318938, 143.139086494))
            Line((-13.892318938, 143.139086494), (-13.892318938, 199.249147057))
            ThreePointArc((-13.892318938, 199.249147057), (0, 213.141465996), (13.892318938, 199.249147057))
        make_face()
    extrude(amount=-CUT_EXTRUDE_17_DEPTH, mode=Mode.SUBTRACT)

    # 草图34 → 切除-拉伸18 (cut)
    with BuildSketch(Plane(origin=(0, 115, 0), x_dir=(1, 0, 0), z_dir=(0, 1, 0))):
        with BuildLine():
            Line((-6.290976551, 106.02597296), (-6.290976551, 123.135910488))
            ThreePointArc((-6.290976551, 123.135910488), (-4.165768662, 125.261118376), (-2.040560774, 123.135910488))
            Line((-2.040560774, 123.135910488), (-2.040560774, 106.02597296))
            ThreePointArc((-2.040560774, 106.02597296), (-4.165768662, 103.900765071), (-6.290976551, 106.02597296))
        make_face()
    extrude(amount=-CUT_EXTRUDE_18_DEPTH, mode=Mode.SUBTRACT)

    # 草图35 → 凸台-拉伸14 (add)
    with BuildSketch(Plane(origin=(0, 0, -153.704196909), x_dir=(-1, 0, 0), z_dir=(0, 0, -1)).offset(EXTRUDE_START_2)):
        with Locations((2.081569218, 185.281106088)):
            Rectangle(SKETCH_35_W, SKETCH_35_H)
    extrude(amount=EXTRUDE_14_DEPTH)

    # 草图36 → 切除-拉伸19 (cut)
    with BuildSketch(Plane(origin=(0, 188.562212177, 0), x_dir=(1, 0, 0), z_dir=(0, 1, 0))):
        with BuildLine():
            Line((-6.290976551, 123.135910488), (-6.290976551, 106.02597296))
            ThreePointArc((-6.290976551, 106.02597296), (-4.165768662, 103.900765071), (-2.040560774, 106.02597296))
            Line((-2.040560774, 106.02597296), (-2.040560774, 123.135910488))
            ThreePointArc((-2.040560774, 123.135910488), (-4.165768662, 125.261118376), (-6.290976551, 123.135910488))
        make_face()
    extrude(amount=-CUT_EXTRUDE_19_DEPTH, mode=Mode.SUBTRACT)

    # 圆顶1 outline → 圆顶1 (revolve)
    with BuildSketch(Plane(origin=(-1.759460278, 160.757687824, 86.457916141), x_dir=(1, 0, 0), z_dir=(0, 0.880708633302661, 0.473658424633363))):
        with BuildLine():
            Line((0, 124.068154246), (0, 119.068154237))
            ThreePointArc((0, 119.068154237), (4.764342278, 120.41858011), (8.111462832, 124.068154246))
            Line((8.111462832, 124.068154246), (0, 124.068154246))
        make_face()
    revolve(axis=Axis((-1.759460278, 160.757687824, 86.457916141), (0, 0.473658424633363, -0.880708633302661)))

    # 草图37 → 切除-拉伸20 (cut)
    with BuildSketch(Plane.XY.offset(-78.704196909).offset(CUT_EXTRUDE_START_2)):
        with BuildLine():
            Line((-27.985541705, 115), (23.82240327, 115))
            Line((23.82240327, 115), (23.82240327, 244))
            ThreePointArc((23.82240327, 244), (20.014791425, 253.192388155), (10.82240327, 257))
            Line((10.82240327, 257), (-14.985541705, 257))
            ThreePointArc((-14.985541705, 257), (-24.177929861, 253.192388155), (-27.985541705, 244))
            Line((-27.985541705, 244), (-27.985541705, 115))
        make_face()
    extrude(amount=-CUT_EXTRUDE_20_DEPTH, mode=Mode.SUBTRACT)

    # 草图40 → 切除-拉伸24 (cut)
    with BuildSketch(Plane(origin=(0, 115, 0), x_dir=(1, 0, 0), z_dir=(0, 1, 0))):
        with Locations(Location((-2.06616942, 31.55452141, 0), (0, 0, 270))):
            Circle(SKETCH_40_R)
    extrude(amount=-CUT_EXTRUDE_24_DEPTH, mode=Mode.SUBTRACT)

    # 倒角1
    chamfer_1_edges = [part.edges().sort_by_distance(p)[0] for p in [
        (0, 115, 55),
    ]]
    chamfer(chamfer_1_edges, length=CHAMFER_1_SIZE)

    # 倒角2
    chamfer_2_edges = [part.edges().sort_by_distance(p)[0] for p in [
        (0, 110, 45),
    ]]
    chamfer(chamfer_2_edges, length=CHAMFER_2_SIZE)

    # 草图41 → 切除-拉伸25 (cut)
    with BuildSketch(Plane(origin=(0, 115, 0), x_dir=(1, 0, 0), z_dir=(0, 1, 0))):
        with BuildLine():
            Line((-120, -147.309198627), (-27.250371239, -25))
            Line((-27.250371239, -25), (27.250371239, -25))
            Line((27.250371239, -25), (120, -147.309198627))
            ThreePointArc((120, -147.309198627), (0, 190), (-120, -147.309198627))
        make_face()
    extrude(amount=CUT_EXTRUDE_25_DEPTH, mode=Mode.SUBTRACT)


solid = part.part
